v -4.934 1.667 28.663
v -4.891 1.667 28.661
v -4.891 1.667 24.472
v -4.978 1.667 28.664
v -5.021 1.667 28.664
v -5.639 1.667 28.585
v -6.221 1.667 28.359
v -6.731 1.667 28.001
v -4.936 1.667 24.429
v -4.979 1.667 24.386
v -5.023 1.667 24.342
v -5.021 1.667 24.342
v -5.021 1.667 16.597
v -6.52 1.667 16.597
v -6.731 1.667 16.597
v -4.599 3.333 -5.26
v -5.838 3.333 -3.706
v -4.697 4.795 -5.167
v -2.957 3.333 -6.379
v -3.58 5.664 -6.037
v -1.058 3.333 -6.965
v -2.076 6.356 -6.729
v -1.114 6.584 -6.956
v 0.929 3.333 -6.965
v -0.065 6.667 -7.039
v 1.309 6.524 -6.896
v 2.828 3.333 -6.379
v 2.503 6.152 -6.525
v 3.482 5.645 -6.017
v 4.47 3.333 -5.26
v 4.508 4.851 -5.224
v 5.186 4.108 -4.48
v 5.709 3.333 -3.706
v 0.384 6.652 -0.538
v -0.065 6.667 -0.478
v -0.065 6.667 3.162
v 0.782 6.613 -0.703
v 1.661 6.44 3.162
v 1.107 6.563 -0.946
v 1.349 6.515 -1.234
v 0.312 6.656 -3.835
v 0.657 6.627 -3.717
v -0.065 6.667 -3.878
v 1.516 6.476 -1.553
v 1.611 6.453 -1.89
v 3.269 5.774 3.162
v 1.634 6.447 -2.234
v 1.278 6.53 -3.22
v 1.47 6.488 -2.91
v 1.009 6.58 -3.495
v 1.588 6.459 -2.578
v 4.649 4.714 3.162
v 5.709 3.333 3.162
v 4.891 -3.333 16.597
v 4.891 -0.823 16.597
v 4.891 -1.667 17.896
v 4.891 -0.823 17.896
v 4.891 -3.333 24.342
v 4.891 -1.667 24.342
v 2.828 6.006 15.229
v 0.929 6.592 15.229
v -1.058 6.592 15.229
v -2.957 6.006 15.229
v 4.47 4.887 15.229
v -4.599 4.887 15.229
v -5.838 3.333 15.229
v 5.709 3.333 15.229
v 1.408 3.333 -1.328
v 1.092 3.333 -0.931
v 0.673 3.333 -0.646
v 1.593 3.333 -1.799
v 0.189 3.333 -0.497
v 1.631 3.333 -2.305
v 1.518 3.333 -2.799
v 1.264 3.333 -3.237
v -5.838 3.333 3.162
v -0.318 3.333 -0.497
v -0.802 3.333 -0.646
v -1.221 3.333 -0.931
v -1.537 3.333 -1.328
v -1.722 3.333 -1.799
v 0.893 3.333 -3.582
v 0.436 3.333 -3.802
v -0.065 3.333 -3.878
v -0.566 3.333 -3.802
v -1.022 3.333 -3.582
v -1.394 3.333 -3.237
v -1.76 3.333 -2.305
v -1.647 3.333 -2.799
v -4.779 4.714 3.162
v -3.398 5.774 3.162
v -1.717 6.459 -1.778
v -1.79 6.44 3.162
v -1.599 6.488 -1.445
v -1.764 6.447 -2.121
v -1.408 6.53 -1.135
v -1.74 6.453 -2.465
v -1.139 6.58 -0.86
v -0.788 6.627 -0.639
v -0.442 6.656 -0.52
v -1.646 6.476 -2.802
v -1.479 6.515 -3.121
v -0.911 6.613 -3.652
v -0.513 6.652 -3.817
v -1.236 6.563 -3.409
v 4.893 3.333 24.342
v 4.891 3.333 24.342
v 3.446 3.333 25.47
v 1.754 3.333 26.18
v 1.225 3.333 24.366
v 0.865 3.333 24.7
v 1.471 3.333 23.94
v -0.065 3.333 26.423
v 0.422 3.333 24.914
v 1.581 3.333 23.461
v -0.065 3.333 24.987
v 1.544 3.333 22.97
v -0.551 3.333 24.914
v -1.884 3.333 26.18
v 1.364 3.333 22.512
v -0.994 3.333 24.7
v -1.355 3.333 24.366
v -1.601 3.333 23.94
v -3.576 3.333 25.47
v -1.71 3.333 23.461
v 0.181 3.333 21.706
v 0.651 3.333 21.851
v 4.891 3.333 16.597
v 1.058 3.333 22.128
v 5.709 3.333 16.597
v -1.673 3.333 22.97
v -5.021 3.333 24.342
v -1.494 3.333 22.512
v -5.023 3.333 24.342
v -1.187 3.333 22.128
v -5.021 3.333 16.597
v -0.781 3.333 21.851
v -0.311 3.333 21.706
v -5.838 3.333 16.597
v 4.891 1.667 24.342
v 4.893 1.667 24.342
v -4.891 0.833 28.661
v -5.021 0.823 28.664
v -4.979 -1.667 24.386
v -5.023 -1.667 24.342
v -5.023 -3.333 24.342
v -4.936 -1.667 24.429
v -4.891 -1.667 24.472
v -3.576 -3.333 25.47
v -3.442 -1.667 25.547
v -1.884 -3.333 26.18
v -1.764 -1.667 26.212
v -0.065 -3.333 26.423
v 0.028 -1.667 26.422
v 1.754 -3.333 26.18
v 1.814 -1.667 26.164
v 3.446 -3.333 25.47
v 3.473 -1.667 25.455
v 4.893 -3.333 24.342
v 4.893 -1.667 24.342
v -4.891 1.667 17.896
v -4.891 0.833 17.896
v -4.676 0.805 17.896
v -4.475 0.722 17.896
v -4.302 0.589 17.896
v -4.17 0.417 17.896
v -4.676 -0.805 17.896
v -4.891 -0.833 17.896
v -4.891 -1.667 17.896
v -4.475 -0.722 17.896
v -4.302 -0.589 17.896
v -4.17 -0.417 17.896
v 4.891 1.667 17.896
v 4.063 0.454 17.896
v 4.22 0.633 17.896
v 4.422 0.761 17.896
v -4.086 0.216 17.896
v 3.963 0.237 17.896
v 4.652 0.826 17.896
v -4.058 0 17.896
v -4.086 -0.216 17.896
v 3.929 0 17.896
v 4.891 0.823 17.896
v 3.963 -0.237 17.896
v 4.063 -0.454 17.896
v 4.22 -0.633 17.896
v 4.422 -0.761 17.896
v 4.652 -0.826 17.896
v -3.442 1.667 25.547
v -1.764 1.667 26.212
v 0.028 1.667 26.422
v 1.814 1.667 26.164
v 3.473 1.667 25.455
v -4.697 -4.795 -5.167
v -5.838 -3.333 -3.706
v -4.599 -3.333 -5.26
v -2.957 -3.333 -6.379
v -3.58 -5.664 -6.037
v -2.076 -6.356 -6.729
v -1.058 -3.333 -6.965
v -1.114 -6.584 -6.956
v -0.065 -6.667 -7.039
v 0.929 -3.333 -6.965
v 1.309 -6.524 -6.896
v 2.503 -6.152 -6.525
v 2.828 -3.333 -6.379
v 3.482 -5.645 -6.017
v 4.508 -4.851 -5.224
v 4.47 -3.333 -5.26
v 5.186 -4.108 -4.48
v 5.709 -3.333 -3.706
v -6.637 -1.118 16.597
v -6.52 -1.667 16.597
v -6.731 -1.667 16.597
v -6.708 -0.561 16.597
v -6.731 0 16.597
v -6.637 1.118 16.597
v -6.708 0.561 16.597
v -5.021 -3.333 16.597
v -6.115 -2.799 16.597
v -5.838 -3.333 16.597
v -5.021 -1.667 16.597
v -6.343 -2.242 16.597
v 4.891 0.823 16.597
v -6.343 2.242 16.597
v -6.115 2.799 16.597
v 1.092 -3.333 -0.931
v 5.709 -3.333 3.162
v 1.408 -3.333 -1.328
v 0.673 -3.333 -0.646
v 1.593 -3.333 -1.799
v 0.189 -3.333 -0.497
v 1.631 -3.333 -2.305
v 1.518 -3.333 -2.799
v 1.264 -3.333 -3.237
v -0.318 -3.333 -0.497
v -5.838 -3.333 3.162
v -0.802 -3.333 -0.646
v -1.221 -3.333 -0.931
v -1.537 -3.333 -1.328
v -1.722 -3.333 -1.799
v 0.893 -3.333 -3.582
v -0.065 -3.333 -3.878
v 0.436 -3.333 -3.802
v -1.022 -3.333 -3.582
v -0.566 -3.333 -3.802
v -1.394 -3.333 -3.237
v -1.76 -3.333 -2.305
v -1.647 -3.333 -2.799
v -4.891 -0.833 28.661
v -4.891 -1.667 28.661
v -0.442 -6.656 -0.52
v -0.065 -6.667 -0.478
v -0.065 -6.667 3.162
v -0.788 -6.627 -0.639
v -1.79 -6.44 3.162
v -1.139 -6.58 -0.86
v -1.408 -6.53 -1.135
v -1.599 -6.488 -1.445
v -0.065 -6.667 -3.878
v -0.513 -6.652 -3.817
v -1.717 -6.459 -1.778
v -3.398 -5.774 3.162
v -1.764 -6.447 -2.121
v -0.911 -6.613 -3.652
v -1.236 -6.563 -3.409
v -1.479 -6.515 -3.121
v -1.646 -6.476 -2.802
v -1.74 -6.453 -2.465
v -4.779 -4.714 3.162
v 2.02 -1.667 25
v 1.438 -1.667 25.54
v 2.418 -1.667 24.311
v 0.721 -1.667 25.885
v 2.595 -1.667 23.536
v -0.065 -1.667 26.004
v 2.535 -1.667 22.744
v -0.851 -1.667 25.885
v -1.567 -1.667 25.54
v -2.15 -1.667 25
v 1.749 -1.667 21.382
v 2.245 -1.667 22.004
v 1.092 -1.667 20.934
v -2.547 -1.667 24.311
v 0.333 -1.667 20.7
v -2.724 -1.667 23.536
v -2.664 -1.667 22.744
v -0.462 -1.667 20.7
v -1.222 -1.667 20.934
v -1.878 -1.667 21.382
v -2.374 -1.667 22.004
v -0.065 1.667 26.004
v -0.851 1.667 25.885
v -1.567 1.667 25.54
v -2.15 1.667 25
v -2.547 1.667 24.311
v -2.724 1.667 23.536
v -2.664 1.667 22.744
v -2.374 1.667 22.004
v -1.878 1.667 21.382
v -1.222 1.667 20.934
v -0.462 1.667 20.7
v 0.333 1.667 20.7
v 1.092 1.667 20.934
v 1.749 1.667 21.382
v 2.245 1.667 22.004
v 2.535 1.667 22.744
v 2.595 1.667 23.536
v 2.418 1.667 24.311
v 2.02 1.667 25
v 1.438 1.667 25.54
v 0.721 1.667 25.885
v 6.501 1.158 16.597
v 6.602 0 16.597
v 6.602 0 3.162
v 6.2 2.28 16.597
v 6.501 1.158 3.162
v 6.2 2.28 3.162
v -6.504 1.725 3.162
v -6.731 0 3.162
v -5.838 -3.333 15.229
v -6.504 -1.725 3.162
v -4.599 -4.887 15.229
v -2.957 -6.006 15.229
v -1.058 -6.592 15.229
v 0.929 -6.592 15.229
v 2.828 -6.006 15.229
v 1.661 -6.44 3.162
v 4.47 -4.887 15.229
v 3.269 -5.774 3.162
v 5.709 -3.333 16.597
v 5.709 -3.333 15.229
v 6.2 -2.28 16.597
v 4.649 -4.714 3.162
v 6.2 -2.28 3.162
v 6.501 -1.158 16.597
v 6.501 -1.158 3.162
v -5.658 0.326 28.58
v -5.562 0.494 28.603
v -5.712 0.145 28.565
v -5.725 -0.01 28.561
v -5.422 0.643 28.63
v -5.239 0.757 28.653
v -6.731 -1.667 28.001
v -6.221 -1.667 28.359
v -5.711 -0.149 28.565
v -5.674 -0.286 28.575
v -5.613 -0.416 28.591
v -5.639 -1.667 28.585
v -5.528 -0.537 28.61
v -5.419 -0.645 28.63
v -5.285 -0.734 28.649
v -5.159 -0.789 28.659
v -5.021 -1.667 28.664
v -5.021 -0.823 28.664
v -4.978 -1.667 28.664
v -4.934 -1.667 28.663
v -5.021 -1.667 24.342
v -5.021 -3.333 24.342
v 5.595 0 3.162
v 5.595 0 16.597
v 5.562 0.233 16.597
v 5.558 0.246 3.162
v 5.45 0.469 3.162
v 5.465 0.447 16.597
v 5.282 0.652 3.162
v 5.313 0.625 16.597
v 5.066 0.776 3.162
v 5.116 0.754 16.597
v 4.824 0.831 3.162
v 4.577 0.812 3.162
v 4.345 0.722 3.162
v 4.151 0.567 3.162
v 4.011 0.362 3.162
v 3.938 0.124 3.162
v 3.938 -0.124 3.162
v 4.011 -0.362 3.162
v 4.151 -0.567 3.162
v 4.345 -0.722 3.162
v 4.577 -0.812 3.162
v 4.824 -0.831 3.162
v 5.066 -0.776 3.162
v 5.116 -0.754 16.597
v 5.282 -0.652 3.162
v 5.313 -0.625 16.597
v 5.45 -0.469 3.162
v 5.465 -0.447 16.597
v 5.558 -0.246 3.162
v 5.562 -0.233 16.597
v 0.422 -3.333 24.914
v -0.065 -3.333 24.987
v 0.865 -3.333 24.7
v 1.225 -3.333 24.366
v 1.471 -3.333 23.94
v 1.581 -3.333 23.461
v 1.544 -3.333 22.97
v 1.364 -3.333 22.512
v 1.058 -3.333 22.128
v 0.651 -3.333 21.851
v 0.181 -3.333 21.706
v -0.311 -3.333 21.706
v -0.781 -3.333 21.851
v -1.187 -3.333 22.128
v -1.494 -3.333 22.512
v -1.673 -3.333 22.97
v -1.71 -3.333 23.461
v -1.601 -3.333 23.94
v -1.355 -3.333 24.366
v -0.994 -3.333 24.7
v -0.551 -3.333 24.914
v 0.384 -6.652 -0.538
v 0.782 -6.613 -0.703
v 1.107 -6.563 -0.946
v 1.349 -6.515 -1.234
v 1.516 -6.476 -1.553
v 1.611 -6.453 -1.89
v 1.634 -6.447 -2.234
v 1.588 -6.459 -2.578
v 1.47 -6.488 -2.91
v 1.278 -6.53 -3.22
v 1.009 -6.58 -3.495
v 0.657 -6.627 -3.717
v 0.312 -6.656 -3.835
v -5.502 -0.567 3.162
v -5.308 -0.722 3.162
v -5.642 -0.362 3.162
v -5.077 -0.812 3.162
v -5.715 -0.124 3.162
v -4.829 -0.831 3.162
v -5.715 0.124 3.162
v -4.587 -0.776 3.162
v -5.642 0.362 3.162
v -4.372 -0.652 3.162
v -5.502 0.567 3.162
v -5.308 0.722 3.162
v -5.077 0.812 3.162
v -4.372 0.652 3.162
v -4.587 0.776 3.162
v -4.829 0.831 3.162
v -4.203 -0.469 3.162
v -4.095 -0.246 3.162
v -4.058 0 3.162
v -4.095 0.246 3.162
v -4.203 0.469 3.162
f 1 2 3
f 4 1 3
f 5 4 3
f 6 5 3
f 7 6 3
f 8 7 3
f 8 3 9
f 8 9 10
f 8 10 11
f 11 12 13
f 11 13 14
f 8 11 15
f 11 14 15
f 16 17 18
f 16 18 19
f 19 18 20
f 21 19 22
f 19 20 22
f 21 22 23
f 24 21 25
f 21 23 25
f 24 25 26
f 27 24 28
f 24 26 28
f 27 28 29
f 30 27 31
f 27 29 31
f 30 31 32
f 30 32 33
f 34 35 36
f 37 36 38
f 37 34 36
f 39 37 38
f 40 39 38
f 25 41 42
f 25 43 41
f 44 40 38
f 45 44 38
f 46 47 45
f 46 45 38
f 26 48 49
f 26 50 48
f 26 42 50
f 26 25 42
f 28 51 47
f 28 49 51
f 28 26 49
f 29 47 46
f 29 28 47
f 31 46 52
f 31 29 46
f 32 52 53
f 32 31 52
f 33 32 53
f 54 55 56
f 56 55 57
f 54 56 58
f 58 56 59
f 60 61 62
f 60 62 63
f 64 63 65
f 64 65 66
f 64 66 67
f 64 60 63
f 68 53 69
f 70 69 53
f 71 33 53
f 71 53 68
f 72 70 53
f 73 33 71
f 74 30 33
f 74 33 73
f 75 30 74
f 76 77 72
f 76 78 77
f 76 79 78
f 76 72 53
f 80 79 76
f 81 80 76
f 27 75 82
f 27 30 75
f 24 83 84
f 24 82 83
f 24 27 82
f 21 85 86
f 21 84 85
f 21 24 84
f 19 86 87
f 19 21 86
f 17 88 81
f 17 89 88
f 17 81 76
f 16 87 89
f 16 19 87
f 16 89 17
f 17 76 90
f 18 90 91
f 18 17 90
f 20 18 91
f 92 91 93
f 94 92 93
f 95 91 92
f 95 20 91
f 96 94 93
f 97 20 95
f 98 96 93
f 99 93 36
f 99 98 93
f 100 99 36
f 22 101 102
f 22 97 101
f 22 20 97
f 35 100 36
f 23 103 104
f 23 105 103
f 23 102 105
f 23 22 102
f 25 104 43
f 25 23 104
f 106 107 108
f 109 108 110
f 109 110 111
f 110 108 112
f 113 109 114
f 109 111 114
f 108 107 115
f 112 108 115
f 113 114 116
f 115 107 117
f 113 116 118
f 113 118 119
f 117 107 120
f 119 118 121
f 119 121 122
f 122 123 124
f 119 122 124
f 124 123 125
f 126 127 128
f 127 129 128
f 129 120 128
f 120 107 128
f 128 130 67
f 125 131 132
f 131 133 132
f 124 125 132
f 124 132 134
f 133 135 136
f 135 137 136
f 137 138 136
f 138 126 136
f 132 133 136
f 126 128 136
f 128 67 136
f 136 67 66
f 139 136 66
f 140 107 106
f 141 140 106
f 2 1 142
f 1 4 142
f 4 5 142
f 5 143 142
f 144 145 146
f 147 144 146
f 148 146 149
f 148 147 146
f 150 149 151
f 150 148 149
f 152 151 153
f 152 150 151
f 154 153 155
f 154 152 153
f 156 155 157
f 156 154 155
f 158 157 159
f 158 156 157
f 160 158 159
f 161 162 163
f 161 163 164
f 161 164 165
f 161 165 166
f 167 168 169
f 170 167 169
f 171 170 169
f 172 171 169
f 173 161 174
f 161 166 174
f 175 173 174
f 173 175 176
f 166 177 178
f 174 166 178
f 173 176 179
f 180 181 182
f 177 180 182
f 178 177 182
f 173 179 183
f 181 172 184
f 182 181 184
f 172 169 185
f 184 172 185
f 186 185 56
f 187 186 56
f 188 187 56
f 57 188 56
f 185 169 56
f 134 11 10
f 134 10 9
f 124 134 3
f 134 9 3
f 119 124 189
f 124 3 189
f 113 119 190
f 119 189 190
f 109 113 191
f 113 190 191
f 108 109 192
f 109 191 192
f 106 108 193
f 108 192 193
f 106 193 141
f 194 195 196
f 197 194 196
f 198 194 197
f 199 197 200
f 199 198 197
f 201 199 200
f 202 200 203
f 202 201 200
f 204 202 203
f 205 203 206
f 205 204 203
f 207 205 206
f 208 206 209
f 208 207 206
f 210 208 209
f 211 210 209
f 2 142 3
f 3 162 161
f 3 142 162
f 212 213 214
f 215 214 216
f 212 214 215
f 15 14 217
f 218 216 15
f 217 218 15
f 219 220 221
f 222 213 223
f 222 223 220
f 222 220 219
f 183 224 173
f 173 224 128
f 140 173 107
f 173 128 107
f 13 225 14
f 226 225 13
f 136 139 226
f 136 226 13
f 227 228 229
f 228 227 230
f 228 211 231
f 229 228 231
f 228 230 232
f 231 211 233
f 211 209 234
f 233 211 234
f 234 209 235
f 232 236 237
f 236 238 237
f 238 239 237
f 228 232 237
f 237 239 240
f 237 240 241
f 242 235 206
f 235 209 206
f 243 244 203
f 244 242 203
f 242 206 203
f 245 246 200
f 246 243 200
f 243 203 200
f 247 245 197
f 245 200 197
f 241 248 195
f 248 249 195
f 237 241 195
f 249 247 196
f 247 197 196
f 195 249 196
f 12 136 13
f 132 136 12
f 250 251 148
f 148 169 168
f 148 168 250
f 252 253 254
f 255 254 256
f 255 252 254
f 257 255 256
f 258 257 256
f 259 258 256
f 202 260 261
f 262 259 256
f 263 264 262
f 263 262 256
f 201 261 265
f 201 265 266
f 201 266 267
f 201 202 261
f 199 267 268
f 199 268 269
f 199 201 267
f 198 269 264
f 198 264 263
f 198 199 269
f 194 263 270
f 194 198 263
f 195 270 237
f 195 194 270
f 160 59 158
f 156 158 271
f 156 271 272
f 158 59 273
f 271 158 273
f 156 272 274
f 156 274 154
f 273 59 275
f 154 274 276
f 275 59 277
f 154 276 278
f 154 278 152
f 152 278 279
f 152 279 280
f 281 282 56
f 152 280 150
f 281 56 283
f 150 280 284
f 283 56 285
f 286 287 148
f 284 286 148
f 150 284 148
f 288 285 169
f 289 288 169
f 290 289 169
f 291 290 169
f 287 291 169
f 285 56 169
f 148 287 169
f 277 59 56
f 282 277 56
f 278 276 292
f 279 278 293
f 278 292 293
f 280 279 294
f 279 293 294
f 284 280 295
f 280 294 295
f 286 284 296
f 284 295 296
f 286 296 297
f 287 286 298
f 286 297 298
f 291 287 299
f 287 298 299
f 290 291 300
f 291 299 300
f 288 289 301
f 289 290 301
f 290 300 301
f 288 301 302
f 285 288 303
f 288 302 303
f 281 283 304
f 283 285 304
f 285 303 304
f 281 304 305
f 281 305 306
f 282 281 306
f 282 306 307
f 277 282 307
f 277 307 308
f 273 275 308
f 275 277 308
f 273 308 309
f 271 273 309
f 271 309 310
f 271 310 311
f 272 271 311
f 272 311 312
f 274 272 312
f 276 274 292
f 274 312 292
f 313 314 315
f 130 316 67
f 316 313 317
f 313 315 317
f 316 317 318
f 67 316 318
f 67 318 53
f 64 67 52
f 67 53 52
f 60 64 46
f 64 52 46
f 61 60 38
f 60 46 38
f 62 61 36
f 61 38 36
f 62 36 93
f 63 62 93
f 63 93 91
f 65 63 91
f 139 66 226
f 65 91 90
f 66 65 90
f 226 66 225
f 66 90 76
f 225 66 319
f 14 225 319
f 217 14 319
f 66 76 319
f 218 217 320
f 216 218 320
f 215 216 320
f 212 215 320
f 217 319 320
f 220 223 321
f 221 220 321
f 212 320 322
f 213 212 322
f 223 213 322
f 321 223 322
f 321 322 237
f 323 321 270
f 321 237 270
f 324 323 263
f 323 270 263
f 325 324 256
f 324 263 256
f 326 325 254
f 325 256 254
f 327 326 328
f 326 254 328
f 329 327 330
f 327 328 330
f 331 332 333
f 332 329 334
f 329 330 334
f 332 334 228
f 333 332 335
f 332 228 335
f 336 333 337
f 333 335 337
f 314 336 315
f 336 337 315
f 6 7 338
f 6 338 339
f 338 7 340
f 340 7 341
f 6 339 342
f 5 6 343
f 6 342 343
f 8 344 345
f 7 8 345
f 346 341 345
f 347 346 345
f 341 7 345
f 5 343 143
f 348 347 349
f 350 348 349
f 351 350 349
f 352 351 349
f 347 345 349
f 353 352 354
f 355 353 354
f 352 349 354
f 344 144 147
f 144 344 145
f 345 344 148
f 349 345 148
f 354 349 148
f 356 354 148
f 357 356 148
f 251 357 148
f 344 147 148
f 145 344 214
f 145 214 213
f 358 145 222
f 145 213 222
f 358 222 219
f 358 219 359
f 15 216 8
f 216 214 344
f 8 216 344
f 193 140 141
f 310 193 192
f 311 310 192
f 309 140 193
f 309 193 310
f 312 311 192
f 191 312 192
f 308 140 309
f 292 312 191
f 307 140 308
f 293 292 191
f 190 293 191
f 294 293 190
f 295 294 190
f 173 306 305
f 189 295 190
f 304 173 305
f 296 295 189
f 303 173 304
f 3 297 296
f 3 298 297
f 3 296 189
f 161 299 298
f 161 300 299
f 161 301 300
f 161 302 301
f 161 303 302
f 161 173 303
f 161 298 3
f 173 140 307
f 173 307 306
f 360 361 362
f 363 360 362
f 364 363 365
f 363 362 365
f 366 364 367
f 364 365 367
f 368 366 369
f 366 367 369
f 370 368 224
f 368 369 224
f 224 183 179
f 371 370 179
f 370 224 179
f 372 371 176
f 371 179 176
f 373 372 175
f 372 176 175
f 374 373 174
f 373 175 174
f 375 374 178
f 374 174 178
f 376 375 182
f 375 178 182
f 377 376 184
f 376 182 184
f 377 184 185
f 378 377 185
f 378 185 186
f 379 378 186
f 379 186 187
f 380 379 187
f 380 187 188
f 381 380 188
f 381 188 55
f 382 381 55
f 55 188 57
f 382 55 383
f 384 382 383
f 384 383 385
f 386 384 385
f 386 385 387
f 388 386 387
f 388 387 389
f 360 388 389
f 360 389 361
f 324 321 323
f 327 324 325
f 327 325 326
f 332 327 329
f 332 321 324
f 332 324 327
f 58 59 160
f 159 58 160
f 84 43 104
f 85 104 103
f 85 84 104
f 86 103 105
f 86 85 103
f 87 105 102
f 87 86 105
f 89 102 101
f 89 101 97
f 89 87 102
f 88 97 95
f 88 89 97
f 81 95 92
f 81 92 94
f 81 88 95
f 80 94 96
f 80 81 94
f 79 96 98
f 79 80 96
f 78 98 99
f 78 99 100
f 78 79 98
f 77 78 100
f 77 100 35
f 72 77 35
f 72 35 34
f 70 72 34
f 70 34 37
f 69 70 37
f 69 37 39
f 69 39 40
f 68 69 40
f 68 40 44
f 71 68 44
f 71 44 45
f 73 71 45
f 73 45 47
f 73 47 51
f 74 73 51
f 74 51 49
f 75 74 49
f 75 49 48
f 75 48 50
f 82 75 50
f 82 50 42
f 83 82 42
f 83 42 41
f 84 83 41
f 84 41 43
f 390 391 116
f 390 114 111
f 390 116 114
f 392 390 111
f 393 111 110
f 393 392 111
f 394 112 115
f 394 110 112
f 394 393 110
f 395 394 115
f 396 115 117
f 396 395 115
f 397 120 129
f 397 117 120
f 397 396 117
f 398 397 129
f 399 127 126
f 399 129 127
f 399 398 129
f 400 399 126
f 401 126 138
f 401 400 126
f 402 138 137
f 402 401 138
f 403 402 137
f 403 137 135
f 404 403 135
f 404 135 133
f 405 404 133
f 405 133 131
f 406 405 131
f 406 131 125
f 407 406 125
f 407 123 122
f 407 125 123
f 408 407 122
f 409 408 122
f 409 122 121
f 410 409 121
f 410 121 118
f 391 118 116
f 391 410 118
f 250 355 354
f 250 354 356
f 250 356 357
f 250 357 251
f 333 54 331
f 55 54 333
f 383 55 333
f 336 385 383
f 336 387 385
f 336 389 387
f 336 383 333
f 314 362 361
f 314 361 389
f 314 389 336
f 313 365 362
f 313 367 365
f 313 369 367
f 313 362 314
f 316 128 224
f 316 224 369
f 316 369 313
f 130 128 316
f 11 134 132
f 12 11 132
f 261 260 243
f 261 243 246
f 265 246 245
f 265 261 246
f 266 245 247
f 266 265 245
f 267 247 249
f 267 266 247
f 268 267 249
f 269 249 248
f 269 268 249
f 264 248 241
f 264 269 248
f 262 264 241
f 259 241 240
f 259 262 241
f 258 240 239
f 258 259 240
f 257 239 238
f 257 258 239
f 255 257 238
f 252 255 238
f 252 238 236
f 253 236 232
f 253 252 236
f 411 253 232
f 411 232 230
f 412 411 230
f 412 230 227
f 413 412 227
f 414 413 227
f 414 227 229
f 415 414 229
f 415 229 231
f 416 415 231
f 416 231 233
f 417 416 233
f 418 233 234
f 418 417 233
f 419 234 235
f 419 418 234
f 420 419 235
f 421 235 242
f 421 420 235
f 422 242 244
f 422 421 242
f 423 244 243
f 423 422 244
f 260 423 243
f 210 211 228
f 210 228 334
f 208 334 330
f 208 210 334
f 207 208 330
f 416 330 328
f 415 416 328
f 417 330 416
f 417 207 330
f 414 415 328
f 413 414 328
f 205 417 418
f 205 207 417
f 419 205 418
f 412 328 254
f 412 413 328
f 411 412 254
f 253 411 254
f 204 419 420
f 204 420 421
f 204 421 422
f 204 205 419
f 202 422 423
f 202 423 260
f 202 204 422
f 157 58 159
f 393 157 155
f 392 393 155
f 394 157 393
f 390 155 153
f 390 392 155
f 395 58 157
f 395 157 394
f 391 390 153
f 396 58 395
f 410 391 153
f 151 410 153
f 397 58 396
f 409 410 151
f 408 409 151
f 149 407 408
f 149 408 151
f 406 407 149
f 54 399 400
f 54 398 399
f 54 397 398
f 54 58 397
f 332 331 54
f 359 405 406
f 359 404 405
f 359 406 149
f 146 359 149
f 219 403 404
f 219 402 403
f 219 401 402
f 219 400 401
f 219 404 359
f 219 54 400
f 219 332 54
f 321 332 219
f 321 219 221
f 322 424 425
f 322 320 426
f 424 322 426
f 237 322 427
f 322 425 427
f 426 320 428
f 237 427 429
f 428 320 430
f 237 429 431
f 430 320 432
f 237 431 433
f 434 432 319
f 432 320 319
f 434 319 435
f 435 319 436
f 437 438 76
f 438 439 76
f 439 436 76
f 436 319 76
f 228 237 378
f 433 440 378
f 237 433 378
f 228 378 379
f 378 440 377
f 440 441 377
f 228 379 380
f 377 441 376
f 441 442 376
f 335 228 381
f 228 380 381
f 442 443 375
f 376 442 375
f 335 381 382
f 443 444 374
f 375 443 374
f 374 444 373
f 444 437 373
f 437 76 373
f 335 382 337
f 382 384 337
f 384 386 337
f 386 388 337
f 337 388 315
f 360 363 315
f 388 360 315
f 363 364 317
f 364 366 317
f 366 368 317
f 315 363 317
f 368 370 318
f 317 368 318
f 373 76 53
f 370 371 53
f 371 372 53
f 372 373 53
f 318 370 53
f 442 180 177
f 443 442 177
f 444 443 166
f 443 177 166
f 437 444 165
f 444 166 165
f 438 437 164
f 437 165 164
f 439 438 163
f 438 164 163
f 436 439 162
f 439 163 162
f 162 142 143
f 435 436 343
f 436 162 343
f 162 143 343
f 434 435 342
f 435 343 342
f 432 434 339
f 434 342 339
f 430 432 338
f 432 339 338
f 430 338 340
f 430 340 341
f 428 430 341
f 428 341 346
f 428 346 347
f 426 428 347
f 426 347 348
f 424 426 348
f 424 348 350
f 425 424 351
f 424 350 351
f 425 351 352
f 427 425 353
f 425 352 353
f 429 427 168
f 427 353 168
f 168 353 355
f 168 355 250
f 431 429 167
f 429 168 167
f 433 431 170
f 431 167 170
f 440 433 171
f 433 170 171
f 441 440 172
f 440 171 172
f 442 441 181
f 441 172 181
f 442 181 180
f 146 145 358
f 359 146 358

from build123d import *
from build123d.topology import SkipClean

# Parameters (mm, degrees)
SKETCH2_R                       = 10
PHALANGE_LENGTH_DEPTH           = 22.1
BOSS_EXTRUDE3_DEPTH             = 5
BOSS_EXTRUDE4_DEPTH             = 5
BOSS_EXTRUDE4_DEPTH_BACK        = 5
CUT_EXTRUDE2_START              = -15.3025
CUT_EXTRUDE2_DEPTH              = 15.3025
SKETCH7_R                       = 1.65
CUT_EXTRUDE3_DEPTH              = 10
CUT_EXTRUDE4_DEPTH              = 2.5
CUT_EXTRUDE4_DEPTH_BACK         = 2.5
CUT_EXTRUDE7_REACH              = 43.565
SKETCH4_R                       = 1.65
CUT_EXTRUDE7_DIRECTION_2_REACH  = 43.565
CUT_EXTRUDE_THIN1_START         = 22.1
CUT_EXTRUDE_THIN1_DEPTH         = 10.361670454
BOSS_EXTRUDE5_REACH             = 42.73
SKETCH9_R                       = 4
SKETCH9_R_2                     = 1.65
CUT_EXTRUDE8_REACH              = 41.987
SKETCH10_R                      = 1.25
CUT_EXTRUDE9_START              = -4
CUT_EXTRUDE9_DEPTH              = 4
CUT_EXTRUDE10_REACH             = 42.73
CUT_EXTRUDE10_DIRECTION_2_REACH = 42.73
CUT_EXTRUDE11_START             = -10
CUT_EXTRUDE11_OUTLINE_W         = 2.565773848
CUT_EXTRUDE11_OUTLINE_H         = 11.6166929
CUT_EXTRUDE11_DEPTH             = 10
BOSS_EXTRUDE7_REACH             = 40.388
CUT_EXTRUDE12_REACH             = 41.987
SKETCH10_2_R                    = 1.25
CUT_EXTRUDE12_DIRECTION_2_REACH = 41.987
SKETCH17_R                      = 1.25
SKETCH17_W                      = 2.42123439
SKETCH17_H                      = 5
CUT_EXTRUDE14_DEPTH             = 16.148519
SCALE1_SCALE                    = 0.666666667
CUT_EXTRUDE15_START             = -10
SKETCH18_R                      = 1.65
CUT_EXTRUDE15_DEPTH             = 13.333338
CUT_EXTRUDE16_START             = -3.333333
SKETCH19_R                      = 1.7
CUT_EXTRUDE16_DEPTH             = 13.333338


# Read off the part's stored shape, not the designer's step: Cut-Extrude-Thin1, Cut-Extrude11
with BuildPart() as part:
    # Sketch2 → Phalange Length (new body)
    with BuildSketch(Plane.XY):
        Circle(SKETCH2_R)
    extrude(amount=PHALANGE_LENGTH_DEPTH)

    # Sketch3 → Boss-Extrude3 (add)
    with BuildSketch(Plane(origin=(0, -10, 0), x_dir=(-1, 0, 0), z_dir=(0, -1, 0))):
        with BuildLine():
            Line((-10, 5.302499701), (-10, 0))
            Line((-10, 0), (10, 0))
            Line((10, 0), (10, 5.302499701))
            ThreePointArc((10, 5.302499701), (0, 15.302499701), (-10, 5.302499701))
        make_face()
    boss_extrude3 = extrude(amount=-BOSS_EXTRUDE3_DEPTH)

    # Mirror1: Boss-Extrude3 across plane
    add(boss_extrude3.mirror(Plane.ZX))

    # Sketch5 → Boss-Extrude4 (add, two sides: drawn at the far end of the back side and taken through both)
    with BuildSketch(Plane(origin=(0, 0, 0), x_dir=(1, 0, 0), z_dir=(0, 1, 0)).offset(-BOSS_EXTRUDE4_DEPTH_BACK)):
        with BuildLine():
            Line((-10, -27.883157911), (-10, -22.1))
            Line((-10, -22.1), (10, -22.1))
            Line((10, -22.1), (10, -27.883157911))
            ThreePointArc((10, -27.883157911), (0, -37.451984156), (-10, -27.883157911))
        make_face()
    extrude(amount=BOSS_EXTRUDE4_DEPTH + BOSS_EXTRUDE4_DEPTH_BACK)

    # Sketch6 → Cut-Extrude2 (cut)
    with SkipClean():  # the faces are left unmerged after this step: merging them gives an invalid solid
        with BuildSketch(Plane.XY.offset(CUT_EXTRUDE2_START)):
            with BuildLine():
                ThreePointArc((0, 10), (5, 8.660254038), (8.660254038, 5))
                Line((8.660254038, 5), (10, 5))
                Line((10, 5), (10, 10))
                Line((10, 10), (0, 10))
            make_face()
            with BuildLine():
                Line((10, -5), (8.660254038, -5))
                ThreePointArc((8.660254038, -5), (5, -8.660254038), (0, -10))
                Line((0, -10), (10, -10))
                Line((10, -10), (10, -5))
            make_face()
            with BuildLine():
                ThreePointArc((-8.660254038, 5), (-5, 8.660254038), (0, 10))
                Line((0, 10), (-10, 10))
                Line((-10, 10), (-10, 5))
                Line((-10, 5), (-8.660254038, 5))
            make_face()
            with BuildLine():
                Line((-10, -10), (0, -10))
                ThreePointArc((0, -10), (-5, -8.660254038), (-8.660254038, -5))
                Line((-8.660254038, -5), (-10, -5))
                Line((-10, -5), (-10, -10))
            make_face()
        extrude(amount=CUT_EXTRUDE2_DEPTH, mode=Mode.SUBTRACT)

    # Sketch7 → Cut-Extrude3 (cut)
    with SkipClean():  # the faces are left unmerged after this step: merging them gives an invalid solid
        with BuildSketch(Plane(origin=(0, 5, 0), x_dir=(1, 0, 0), z_dir=(0, 1, 0))):
            with Locations(Location((0, -30.261984156, 0), (0, 0, 270))):
                Circle(SKETCH7_R)
        extrude(amount=-CUT_EXTRUDE3_DEPTH, mode=Mode.SUBTRACT)

    # Sketch5<2> → Cut-Extrude4 (cut, two sides: drawn at the far end of the back side and taken through both)
    with BuildSketch(Plane(origin=(0, 0, 0), x_dir=(1, 0, 0), z_dir=(0, 1, 0)).offset(-CUT_EXTRUDE4_DEPTH_BACK)):
        with BuildLine():
            Line((-10, -27.883157911), (-10, -22.1))
            Line((-10, -22.1), (10, -22.1))
            Line((10, -22.1), (10, -27.883157911))
            ThreePointArc((10, -27.883157911), (0, -37.451984156), (-10, -27.883157911))
        make_face()
    extrude(amount=CUT_EXTRUDE4_DEPTH + CUT_EXTRUDE4_DEPTH_BACK, mode=Mode.SUBTRACT)

    # Sketch4 → Cut-Extrude7 (cut, up to next)
    with BuildSketch(Plane(origin=(0, -5, 0), x_dir=(1, 0, 0), z_dir=(0, 1, 0)), mode=Mode.PRIVATE) as cut_extrude7_sk1:
        with Locations(Location((0, 8.010159673, 0), (0, 0, 270))):
            Circle(SKETCH4_R)
    cut_extrude7_tool1 = extrude(cut_extrude7_sk1.sketch, amount=-CUT_EXTRUDE7_REACH, mode=Mode.PRIVATE) & part.part
    add(cut_extrude7_tool1.solids().sort_by_distance((0, -5, -8.01016))[0], mode=Mode.SUBTRACT)

    # Sketch4 → Cut-Extrude7 direction 2 (cut, up to next)
    with BuildSketch(Plane(origin=(0, -5, 0), x_dir=(1, 0, 0), z_dir=(0, 1, 0)), mode=Mode.PRIVATE) as cut_extrude7_direction_2_sk1:
        with Locations(Location((0, 8.010159673, 0), (0, 0, 270))):
            Circle(SKETCH4_R)
    cut_extrude7_direction_2_tool1 = extrude(cut_extrude7_direction_2_sk1.sketch, amount=CUT_EXTRUDE7_DIRECTION_2_REACH, mode=Mode.PRIVATE) & part.part
    add(cut_extrude7_direction_2_tool1.solids().sort_by_distance((0, -5, -8.01016))[0], mode=Mode.SUBTRACT)

    # Cut-Extrude-Thin1 outline → Cut-Extrude-Thin1 (cut)
    with SkipClean():  # the faces are left unmerged after this step: merging them gives an invalid solid
        with BuildSketch(Plane.XY.offset(CUT_EXTRUDE_THIN1_START)):
            with BuildLine():
                ThreePointArc((8.660254038, 5), (9.256147934, 3.78466979), (9.682458366, 2.5))
                Line((9.682458366, 2.5), (10, 2.5))
                Line((10, 2.5), (10, 5))
                Line((10, 5), (8.660254038, 5))
            make_face()
            with BuildLine():
                Line((10, -2.5), (9.682458366, -2.5))
                ThreePointArc((9.682458366, -2.5), (9.256147934, -3.78466979), (8.660254038, -5))
                Line((8.660254038, -5), (10, -5))
                Line((10, -5), (10, -2.5))
            make_face()
            with BuildLine():
                Line((-10, 2.5), (-9.682458366, 2.5))
                ThreePointArc((-9.682458366, 2.5), (-9.256147934, 3.78466979), (-8.660254038, 5))
                Line((-8.660254038, 5), (-10, 5))
                Line((-10, 5), (-10, 2.5))
            make_face()
            with BuildLine():
                ThreePointArc((-8.660254038, -5), (-9.256147934, -3.78466979), (-9.682458366, -2.5))
                Line((-9.682458366, -2.5), (-10, -2.5))
                Line((-10, -2.5), (-10, -5))
                Line((-10, -5), (-8.660254038, -5))
            make_face()
        extrude(amount=CUT_EXTRUDE_THIN1_DEPTH, mode=Mode.SUBTRACT)

    # Sketch9 → Boss-Extrude5 (add, up to next)
    with BuildSketch(Plane.XZ.offset(-2.5), mode=Mode.PRIVATE) as boss_extrude5_sk1:
        with Locations(Location((0, 30.261984156, 0), (0, 0, 90))):
            Circle(SKETCH9_R)
        with Locations(Location((0, 30.261984156, 0), (0, 0, 90))):
            Circle(SKETCH9_R_2, mode=Mode.SUBTRACT)
    boss_extrude5_tool1 = extrude(boss_extrude5_sk1.sketch, amount=BOSS_EXTRUDE5_REACH, mode=Mode.PRIVATE) - part.part
    add(boss_extrude5_tool1.solids().sort_by_distance((0, 2.5, 26.375121))[0])

    # Sketch10 → Cut-Extrude8 (cut, up to next)
    with BuildSketch(Plane.XY.offset(22.1), mode=Mode.PRIVATE) as cut_extrude8_sk1:
        with Locations((7.239961745, 0)):
            Circle(SKETCH10_R)
    cut_extrude8_tool1 = extrude(cut_extrude8_sk1.sketch, amount=-CUT_EXTRUDE8_REACH, mode=Mode.PRIVATE) & part.part
    # Sketch10 → Cut-Extrude8 (cut, up to next)
    with BuildSketch(Plane.XY.offset(22.1), mode=Mode.PRIVATE) as cut_extrude8_sk2:
        with Locations((-7.239961745, 0)):
            Circle(SKETCH10_R)
    cut_extrude8_tool2 = extrude(cut_extrude8_sk2.sketch, amount=-CUT_EXTRUDE8_REACH, mode=Mode.PRIVATE) & part.part
    add(cut_extrude8_tool1.solids().sort_by_distance((7.239962, 0, 22.1))[0], mode=Mode.SUBTRACT)
    add(cut_extrude8_tool2.solids().sort_by_distance((-7.239962, 0, 22.1))[0], mode=Mode.SUBTRACT)

    # Sketch11 → Cut-Extrude9 (cut)
    with SkipClean():  # the faces are left unmerged after this step: merging them gives an invalid solid
        with BuildSketch(Plane.XY.offset(22.1).offset(CUT_EXTRUDE9_START)):
            with BuildLine():
                ThreePointArc((8.660254038, 5), (0, 10), (-8.660254038, 5))
                Line((-8.660254038, 5), (8.660254038, 5))
            make_face()
            with BuildLine():
                Line((8.660254038, -5), (-8.660254038, -5))
                ThreePointArc((-8.660254038, -5), (0, -10), (8.660254038, -5))
            make_face()
        extrude(amount=CUT_EXTRUDE9_DEPTH, mode=Mode.SUBTRACT)

    # Sketch12 → Cut-Extrude10 (cut, up to next)
    with BuildSketch(Plane.XZ.offset(-2.5), mode=Mode.PRIVATE) as cut_extrude10_sk1:
        with BuildLine():
            Line((-10.033719202, 37.451984156), (-10.033719202, 30.264892021))
            Line((-10.033719202, 30.264892021), (-8.660254038, 30.264892021))
            ThreePointArc((-8.660254038, 30.264892021), (0, 34.890740593), (8.660254038, 30.264892021))
            Line((8.660254038, 30.264892021), (10.033719202, 30.264892021))
            Line((10.033719202, 30.264892021), (10.033719202, 37.451984156))
            Line((10.033719202, 37.451984156), (-10.033719202, 37.451984156))
        make_face()
    cut_extrude10_tool1 = extrude(cut_extrude10_sk1.sketch, amount=CUT_EXTRUDE10_REACH, mode=Mode.PRIVATE) & part.part
    add(cut_extrude10_tool1.solids().sort_by_distance((0, 2.5, 34.950279))[0], mode=Mode.SUBTRACT)

    # Sketch12 → Cut-Extrude10 direction 2 (cut, up to next)
    with BuildSketch(Plane.XZ.offset(-2.5), mode=Mode.PRIVATE) as cut_extrude10_direction_2_sk1:
        with BuildLine():
            Line((-10.033719202, 37.451984156), (-10.033719202, 30.264892021))
            Line((-10.033719202, 30.264892021), (-8.660254038, 30.264892021))
            ThreePointArc((-8.660254038, 30.264892021), (0, 34.890740593), (8.660254038, 30.264892021))
            Line((8.660254038, 30.264892021), (10.033719202, 30.264892021))
            Line((10.033719202, 30.264892021), (10.033719202, 37.451984156))
            Line((10.033719202, 37.451984156), (-10.033719202, 37.451984156))
        make_face()
    cut_extrude10_direction_2_tool1 = extrude(cut_extrude10_direction_2_sk1.sketch, amount=-CUT_EXTRUDE10_DIRECTION_2_REACH, mode=Mode.PRIVATE) & part.part
    add(cut_extrude10_direction_2_tool1.solids().sort_by_distance((0, 2.5, 34.950279))[0], mode=Mode.SUBTRACT)

    # Cut-Extrude11 outline → Cut-Extrude11 (cut)
    with BuildSketch(Plane.XZ.offset(5).offset(CUT_EXTRUDE11_START)):
        with Locations((-8.717113076, 25.960571369)):
            Rectangle(CUT_EXTRUDE11_OUTLINE_W, CUT_EXTRUDE11_OUTLINE_H)
        with Locations((8.717113076, 25.960571369)):
            Rectangle(CUT_EXTRUDE11_OUTLINE_W, CUT_EXTRUDE11_OUTLINE_H)
    extrude(amount=CUT_EXTRUDE11_DEPTH, mode=Mode.SUBTRACT)

    # Boss-Extrude7: up to this face of the body (flat: up to its plane)
    boss_extrude7_end = Plane(part.part.faces().sort_by_distance((0, 2.5, 22.296174341))[0])
    # Sketch16 → Boss-Extrude7 (add, up to the picked face)
    with BuildSketch(Plane(origin=(0, -2.5, 0), x_dir=(1, 0, 0), z_dir=(0, 1, 0)), mode=Mode.PRIVATE) as boss_extrude7_sk1:
        with BuildLine():
            Line((-4.818727355, -20.152224919), (-7.434226152, -20.152224919))
            Line((-7.434226152, -20.152224919), (-10, -20.152224919))
            Line((-10, -20.152224919), (-10, -37.258561033))
            ThreePointArc((-10, -37.258561033), (-8.808295471, -37.990817912), (-7.43422564, -38.252145139))
            ThreePointArc((-7.43422564, -38.252145139), (-6.033645007, -37.999721533), (-4.818727355, -37.258561033))
            Line((-4.818727355, -37.258561033), (-4.818727355, -33.709527951))
            ThreePointArc((-4.818727355, -33.709527951), (-6.204248493, -32.842230104), (-7.437080645, -31.768917819))
            Line((-7.437080645, -31.768917819), (-7.434226152, -31.768917819))
            Line((-7.434226152, -31.768917819), (-7.434226152, -22.1))
            Line((-7.434226152, -22.1), (-4.818727355, -22.1))
            Line((-4.818727355, -22.1), (-4.818727355, -20.152224919))
        make_face()
    boss_extrude7_tool1 = split(extrude(boss_extrude7_sk1.sketch, amount=BOSS_EXTRUDE7_REACH, mode=Mode.PRIVATE), bisect_by=boss_extrude7_end, keep=Keep.BOTH, mode=Mode.PRIVATE)
    # Sketch16 → Boss-Extrude7 (add, up to the picked face)
    with BuildSketch(Plane(origin=(0, -2.5, 0), x_dir=(1, 0, 0), z_dir=(0, 1, 0)), mode=Mode.PRIVATE) as boss_extrude7_sk2:
        with BuildLine():
            Line((-4.818727355, -33.709527951), (-4.818727355, -22.1))
            Line((-4.818727355, -22.1), (-7.434226152, -22.1))
            Line((-7.434226152, -22.1), (-7.434226152, -31.768917819))
            Line((-7.434226152, -31.768917819), (-7.437080645, -31.768917819))
            ThreePointArc((-7.437080645, -31.768917819), (-6.204248493, -32.842230104), (-4.818727355, -33.709527951))
        make_face()
    boss_extrude7_tool2 = split(extrude(boss_extrude7_sk2.sketch, amount=BOSS_EXTRUDE7_REACH, mode=Mode.PRIVATE), bisect_by=boss_extrude7_end, keep=Keep.BOTH, mode=Mode.PRIVATE)
    add(boss_extrude7_tool1.solids().sort_by(Axis((-7.989429, -2.5, 29.733344), (0, 1, 0)))[0])
    add(boss_extrude7_tool2.solids().sort_by(Axis((-6.08748, -2.5, 27.4879), (0, 1, 0)))[0])

    # Sketch10<2> → Cut-Extrude12 (cut, up to next)
    with BuildSketch(Plane.XY.offset(22.1), mode=Mode.PRIVATE) as cut_extrude12_sk1:
        with Locations((-7.239961745, 0)):
            Circle(SKETCH10_2_R)
    cut_extrude12_tool1 = extrude(cut_extrude12_sk1.sketch, amount=CUT_EXTRUDE12_REACH, mode=Mode.PRIVATE) & part.part
    add(cut_extrude12_tool1.solids().sort_by_distance((-7.239962, 0, 22.1))[0], mode=Mode.SUBTRACT)

    # Sketch10<2> → Cut-Extrude12 direction 2 (cut, up to next)
    with BuildSketch(Plane.XY.offset(22.1), mode=Mode.PRIVATE) as cut_extrude12_direction_2_sk1:
        with Locations((-7.239961745, 0)):
            Circle(SKETCH10_2_R)
    cut_extrude12_direction_2_tool1 = extrude(cut_extrude12_direction_2_sk1.sketch, amount=-CUT_EXTRUDE12_DIRECTION_2_REACH, mode=Mode.PRIVATE) & part.part
    add(cut_extrude12_direction_2_tool1.solids().sort_by_distance((-7.239962, 0, 22.1))[0], mode=Mode.SUBTRACT)

    # Sketch17 → Cut-Extrude14 (cut)
    with SkipClean():  # the faces are left unmerged after this step: merging them gives an invalid solid
        with BuildSketch(Plane.XY.offset(22.1)):
            with Locations((-7.239961745, 0)):
                Circle(SKETCH17_R)
            with Locations((-6.02934455, 0)):
                Rectangle(SKETCH17_W, SKETCH17_H)
        extrude(amount=CUT_EXTRUDE14_DEPTH, mode=Mode.SUBTRACT)


with BuildPart() as part_1:
    # Scale1: scaled about (-0.194054701, -1.77e-07, 9.487138568)
    add(part.part.scale(SCALE1_SCALE).moved(Location((-0.0646849, -5.9e-08, 3.162379523))))

    # Sketch18 → Cut-Extrude15 (cut)
    with BuildSketch(Plane(origin=(0, 3.333328714, 0), x_dir=(1, 0, 0), z_dir=(0, 1, 0)).offset(CUT_EXTRUDE15_START)):
        with Locations(Location((-0.064694214, -23.337201464, 0), (0, 0, 270))):
            Circle(SKETCH18_R)
    extrude(amount=CUT_EXTRUDE15_DEPTH, mode=Mode.SUBTRACT)

    # Sketch19 → Cut-Extrude16 (cut)
    with BuildSketch(Plane(origin=(0, -3.333337953, 0), x_dir=(1, 0, 0), z_dir=(0, 1, 0)).offset(CUT_EXTRUDE16_START)):
        with Locations(Location((-0.064694214, 2.177561088, 0), (0, 0, 90))):
            Circle(SKETCH19_R)
    extrude(amount=CUT_EXTRUDE16_DEPTH, mode=Mode.SUBTRACT)


solid = part_1.part
